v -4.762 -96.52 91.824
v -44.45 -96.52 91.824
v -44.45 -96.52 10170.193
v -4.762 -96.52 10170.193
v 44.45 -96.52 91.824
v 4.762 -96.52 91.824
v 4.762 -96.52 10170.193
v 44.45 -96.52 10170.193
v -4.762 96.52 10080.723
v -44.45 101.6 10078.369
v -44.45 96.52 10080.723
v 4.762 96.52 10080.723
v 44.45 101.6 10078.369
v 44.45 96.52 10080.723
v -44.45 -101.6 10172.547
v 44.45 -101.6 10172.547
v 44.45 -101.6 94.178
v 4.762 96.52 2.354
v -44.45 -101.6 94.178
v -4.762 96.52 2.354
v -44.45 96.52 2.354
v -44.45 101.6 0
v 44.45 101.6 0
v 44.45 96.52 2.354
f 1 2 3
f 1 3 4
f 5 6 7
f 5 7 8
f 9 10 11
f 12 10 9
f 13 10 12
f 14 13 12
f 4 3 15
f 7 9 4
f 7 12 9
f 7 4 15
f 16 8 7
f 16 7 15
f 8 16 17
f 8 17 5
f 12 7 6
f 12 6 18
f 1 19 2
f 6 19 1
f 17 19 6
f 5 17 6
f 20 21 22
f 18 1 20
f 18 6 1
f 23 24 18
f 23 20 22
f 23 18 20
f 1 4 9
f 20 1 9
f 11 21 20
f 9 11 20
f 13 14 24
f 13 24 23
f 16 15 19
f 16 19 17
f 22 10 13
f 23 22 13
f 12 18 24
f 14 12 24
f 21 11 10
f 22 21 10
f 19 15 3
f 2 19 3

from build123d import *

# Parameters (mm, degrees)
F0_W     = 88.9
F0_H     = 203.2
F1_DEPTH = 10668
F2_W     = 39.6875
F2_H     = 193.04
F3_DEPTH = 10668.001
F5_DEPTH = 63.5


with BuildPart() as f1:
    # F0 (on Top) → F1 (new body)
    with BuildSketch(Plane.XY):
        Rectangle(F0_W, F0_H)
    extrude(amount=F1_DEPTH)

    # F2 (on Top) → F3 (cut, through all)
    with BuildSketch(Plane.XY):
        with Locations((-24.60625, 0)):
            Rectangle(F2_W, F2_H)
        with Locations((24.60625, 0)):
            Rectangle(F2_W, F2_H)
    extrude(amount=F3_DEPTH, mode=Mode.SUBTRACT)

    # F4 (on Right) → F5 (intersect, symmetric)
    with BuildSketch(Plane.YZ):
        Polygon((-101.6, 94.178148), (101.6, 0), (101.6, 10078.368968), (-101.6, 10172.547116), align=None)
    extrude(amount=F5_DEPTH, both=True, mode=Mode.INTERSECT)


solid = f1.part
